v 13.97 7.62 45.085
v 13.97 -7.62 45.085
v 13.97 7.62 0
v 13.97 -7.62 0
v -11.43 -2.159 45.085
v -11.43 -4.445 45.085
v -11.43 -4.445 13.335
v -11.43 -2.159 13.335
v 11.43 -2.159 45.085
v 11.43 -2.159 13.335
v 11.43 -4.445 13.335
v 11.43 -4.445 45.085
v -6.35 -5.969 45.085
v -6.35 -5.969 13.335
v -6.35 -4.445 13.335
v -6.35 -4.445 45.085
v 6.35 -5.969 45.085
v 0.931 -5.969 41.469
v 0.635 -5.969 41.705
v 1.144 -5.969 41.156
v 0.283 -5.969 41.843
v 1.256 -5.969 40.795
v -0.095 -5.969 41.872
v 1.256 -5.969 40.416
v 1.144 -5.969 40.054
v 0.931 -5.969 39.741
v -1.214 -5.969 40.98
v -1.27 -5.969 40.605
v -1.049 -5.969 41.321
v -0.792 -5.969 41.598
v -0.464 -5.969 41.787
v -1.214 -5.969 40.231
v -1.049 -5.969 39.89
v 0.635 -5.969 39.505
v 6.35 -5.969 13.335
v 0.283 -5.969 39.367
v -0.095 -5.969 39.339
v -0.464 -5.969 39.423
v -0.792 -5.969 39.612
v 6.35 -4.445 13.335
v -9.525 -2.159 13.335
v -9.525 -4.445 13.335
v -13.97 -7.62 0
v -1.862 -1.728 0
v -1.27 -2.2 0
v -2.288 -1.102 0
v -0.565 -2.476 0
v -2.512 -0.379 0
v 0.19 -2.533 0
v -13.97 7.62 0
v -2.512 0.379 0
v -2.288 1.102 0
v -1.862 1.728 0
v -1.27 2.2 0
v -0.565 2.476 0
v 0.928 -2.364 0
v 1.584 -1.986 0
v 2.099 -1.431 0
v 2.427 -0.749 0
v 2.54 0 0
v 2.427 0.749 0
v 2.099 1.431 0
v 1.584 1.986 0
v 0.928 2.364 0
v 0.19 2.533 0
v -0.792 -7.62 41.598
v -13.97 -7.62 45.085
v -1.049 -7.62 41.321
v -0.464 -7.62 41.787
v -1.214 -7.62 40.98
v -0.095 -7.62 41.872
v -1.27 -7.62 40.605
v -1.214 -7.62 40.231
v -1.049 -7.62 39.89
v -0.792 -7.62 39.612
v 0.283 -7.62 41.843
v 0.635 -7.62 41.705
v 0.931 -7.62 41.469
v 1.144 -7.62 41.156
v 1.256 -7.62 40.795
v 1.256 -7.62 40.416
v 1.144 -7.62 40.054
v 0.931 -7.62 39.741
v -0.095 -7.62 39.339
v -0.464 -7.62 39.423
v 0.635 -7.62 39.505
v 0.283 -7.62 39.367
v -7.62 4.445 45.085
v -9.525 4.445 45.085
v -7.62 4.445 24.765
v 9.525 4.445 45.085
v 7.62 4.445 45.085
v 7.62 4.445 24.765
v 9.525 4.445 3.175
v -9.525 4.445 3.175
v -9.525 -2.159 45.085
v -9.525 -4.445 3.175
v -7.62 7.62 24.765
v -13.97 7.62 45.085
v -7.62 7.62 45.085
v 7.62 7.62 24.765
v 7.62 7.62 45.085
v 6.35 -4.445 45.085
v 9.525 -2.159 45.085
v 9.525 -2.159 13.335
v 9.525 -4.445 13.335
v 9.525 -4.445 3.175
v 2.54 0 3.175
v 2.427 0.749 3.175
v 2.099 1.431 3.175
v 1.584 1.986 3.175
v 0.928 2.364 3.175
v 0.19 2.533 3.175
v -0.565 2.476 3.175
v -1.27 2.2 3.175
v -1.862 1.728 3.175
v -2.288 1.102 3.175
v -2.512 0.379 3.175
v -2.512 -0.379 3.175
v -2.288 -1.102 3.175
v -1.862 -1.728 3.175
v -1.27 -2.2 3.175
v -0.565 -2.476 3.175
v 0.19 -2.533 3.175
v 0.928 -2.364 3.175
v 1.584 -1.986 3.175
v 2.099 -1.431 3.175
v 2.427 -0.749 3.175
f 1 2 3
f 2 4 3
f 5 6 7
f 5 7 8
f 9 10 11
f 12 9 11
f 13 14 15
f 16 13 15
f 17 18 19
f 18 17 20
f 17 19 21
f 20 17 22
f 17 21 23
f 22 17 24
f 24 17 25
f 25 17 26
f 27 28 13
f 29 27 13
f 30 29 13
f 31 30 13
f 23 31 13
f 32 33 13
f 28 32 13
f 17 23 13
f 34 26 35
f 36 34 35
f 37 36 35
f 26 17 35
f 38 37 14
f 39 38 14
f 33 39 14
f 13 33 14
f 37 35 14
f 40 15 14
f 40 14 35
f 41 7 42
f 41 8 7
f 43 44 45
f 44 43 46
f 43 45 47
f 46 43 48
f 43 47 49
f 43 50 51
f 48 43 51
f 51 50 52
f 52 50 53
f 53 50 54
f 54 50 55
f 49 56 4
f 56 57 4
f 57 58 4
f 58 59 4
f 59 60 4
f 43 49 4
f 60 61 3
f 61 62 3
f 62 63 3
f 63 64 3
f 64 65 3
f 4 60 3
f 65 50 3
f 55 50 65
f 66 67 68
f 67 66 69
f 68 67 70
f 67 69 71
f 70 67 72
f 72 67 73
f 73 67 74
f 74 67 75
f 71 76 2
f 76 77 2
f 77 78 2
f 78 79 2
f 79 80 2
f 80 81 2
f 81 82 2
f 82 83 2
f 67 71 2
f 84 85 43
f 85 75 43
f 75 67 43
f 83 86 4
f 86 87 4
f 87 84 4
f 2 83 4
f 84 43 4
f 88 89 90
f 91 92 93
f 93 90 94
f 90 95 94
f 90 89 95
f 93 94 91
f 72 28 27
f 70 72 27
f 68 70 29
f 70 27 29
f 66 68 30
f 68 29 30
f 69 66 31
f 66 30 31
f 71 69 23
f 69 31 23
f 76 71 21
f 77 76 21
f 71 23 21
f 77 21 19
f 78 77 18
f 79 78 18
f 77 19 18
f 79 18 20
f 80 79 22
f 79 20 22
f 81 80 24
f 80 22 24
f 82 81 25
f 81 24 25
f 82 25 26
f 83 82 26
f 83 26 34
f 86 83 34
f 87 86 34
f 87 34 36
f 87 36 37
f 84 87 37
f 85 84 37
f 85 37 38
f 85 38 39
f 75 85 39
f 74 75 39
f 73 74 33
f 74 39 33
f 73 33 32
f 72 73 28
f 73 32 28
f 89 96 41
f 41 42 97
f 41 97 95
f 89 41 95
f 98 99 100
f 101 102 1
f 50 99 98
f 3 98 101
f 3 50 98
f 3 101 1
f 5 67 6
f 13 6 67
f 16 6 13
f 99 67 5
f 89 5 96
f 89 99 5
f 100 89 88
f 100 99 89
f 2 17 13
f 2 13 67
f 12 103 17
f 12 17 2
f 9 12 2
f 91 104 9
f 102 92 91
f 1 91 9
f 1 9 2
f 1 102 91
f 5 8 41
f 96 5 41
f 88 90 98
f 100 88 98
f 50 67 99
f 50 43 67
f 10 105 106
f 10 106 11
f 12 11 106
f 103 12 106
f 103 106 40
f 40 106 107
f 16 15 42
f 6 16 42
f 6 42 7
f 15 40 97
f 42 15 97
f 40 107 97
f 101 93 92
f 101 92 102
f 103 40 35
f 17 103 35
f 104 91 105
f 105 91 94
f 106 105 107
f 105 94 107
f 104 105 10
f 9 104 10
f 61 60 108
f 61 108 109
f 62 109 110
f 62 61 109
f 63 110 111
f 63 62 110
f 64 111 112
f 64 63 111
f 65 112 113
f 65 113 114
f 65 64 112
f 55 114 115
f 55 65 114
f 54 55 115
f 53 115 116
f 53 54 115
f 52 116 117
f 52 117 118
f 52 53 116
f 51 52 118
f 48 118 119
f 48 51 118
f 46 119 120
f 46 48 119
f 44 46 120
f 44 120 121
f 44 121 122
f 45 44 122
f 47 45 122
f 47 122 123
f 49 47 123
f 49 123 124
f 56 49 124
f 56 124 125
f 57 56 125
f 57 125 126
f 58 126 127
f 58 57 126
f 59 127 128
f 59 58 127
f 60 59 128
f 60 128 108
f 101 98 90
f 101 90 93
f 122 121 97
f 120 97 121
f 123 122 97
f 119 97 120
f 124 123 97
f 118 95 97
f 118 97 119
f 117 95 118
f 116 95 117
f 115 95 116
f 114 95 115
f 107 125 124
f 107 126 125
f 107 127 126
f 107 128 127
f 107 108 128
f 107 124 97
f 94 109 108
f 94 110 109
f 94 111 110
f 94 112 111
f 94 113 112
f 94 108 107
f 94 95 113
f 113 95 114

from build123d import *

# Parameters (mm, degrees)
F0_W     = 27.94
F0_H     = 15.24
F0_R     = 2.54
F1_DEPTH = 3.175
F2_W     = 27.94
F2_H     = 15.24
F2_W_2   = 19.05
F2_H_2   = 8.89
F3_DEPTH = 10.16
F4_W     = 27.94
F4_H     = 15.24
F5_DEPTH = 31.75
F6_W     = 15.24
F6_H     = 3.175
F7_DEPTH = 20.32
F8_R     = 1.27
F9_DEPTH = 1.651


with BuildPart() as f1:
    # F0 (on Top) → F1 (new body)
    with BuildSketch(Plane.XY):
        Rectangle(F0_W, F0_H)
        Circle(F0_R, mode=Mode.SUBTRACT)
    extrude(amount=F1_DEPTH)

    # F2 (on face) → F3 (join)
    with BuildSketch(Plane.XY.offset(3.175)):
        Rectangle(F2_W, F2_H)
        Rectangle(F2_W_2, F2_H_2, mode=Mode.SUBTRACT)
    extrude(amount=F3_DEPTH)

    # F4 (on face) → F5 (join)
    with BuildSketch(Plane.XY.offset(13.335)):
        Rectangle(F4_W, F4_H)
        Polygon((-9.525, -4.445), (-11.43, -4.445), (-11.43, -2.159), (-9.525, -2.159), (-9.525, 4.445), (9.525, 4.445), (9.525, -2.159), (11.43, -2.159), (11.43, -4.445), (9.525, -4.445), (6.35, -4.445), (6.35, -5.969), (-6.35, -5.969), (-6.35, -4.445), align=None, mode=Mode.SUBTRACT)
    extrude(amount=F5_DEPTH)

    # F6 (on face) → F7 (cut)
    with BuildSketch(Plane.XY.offset(45.085)):
        with Locations((0, 6.0325)):
            Rectangle(F6_W, F6_H)
    extrude(amount=-F7_DEPTH, mode=Mode.SUBTRACT)

    # F8 (on face) → F9 (cut, through all)
    with BuildSketch(Plane(origin=(0, -5.969, 0), x_dir=(-1, 0, 0), z_dir=(0, 1, 0))):
        with Locations((0, 40.6052581966)):
            Circle(F8_R)
    extrude(amount=-F9_DEPTH, mode=Mode.SUBTRACT)


solid = f1.part
